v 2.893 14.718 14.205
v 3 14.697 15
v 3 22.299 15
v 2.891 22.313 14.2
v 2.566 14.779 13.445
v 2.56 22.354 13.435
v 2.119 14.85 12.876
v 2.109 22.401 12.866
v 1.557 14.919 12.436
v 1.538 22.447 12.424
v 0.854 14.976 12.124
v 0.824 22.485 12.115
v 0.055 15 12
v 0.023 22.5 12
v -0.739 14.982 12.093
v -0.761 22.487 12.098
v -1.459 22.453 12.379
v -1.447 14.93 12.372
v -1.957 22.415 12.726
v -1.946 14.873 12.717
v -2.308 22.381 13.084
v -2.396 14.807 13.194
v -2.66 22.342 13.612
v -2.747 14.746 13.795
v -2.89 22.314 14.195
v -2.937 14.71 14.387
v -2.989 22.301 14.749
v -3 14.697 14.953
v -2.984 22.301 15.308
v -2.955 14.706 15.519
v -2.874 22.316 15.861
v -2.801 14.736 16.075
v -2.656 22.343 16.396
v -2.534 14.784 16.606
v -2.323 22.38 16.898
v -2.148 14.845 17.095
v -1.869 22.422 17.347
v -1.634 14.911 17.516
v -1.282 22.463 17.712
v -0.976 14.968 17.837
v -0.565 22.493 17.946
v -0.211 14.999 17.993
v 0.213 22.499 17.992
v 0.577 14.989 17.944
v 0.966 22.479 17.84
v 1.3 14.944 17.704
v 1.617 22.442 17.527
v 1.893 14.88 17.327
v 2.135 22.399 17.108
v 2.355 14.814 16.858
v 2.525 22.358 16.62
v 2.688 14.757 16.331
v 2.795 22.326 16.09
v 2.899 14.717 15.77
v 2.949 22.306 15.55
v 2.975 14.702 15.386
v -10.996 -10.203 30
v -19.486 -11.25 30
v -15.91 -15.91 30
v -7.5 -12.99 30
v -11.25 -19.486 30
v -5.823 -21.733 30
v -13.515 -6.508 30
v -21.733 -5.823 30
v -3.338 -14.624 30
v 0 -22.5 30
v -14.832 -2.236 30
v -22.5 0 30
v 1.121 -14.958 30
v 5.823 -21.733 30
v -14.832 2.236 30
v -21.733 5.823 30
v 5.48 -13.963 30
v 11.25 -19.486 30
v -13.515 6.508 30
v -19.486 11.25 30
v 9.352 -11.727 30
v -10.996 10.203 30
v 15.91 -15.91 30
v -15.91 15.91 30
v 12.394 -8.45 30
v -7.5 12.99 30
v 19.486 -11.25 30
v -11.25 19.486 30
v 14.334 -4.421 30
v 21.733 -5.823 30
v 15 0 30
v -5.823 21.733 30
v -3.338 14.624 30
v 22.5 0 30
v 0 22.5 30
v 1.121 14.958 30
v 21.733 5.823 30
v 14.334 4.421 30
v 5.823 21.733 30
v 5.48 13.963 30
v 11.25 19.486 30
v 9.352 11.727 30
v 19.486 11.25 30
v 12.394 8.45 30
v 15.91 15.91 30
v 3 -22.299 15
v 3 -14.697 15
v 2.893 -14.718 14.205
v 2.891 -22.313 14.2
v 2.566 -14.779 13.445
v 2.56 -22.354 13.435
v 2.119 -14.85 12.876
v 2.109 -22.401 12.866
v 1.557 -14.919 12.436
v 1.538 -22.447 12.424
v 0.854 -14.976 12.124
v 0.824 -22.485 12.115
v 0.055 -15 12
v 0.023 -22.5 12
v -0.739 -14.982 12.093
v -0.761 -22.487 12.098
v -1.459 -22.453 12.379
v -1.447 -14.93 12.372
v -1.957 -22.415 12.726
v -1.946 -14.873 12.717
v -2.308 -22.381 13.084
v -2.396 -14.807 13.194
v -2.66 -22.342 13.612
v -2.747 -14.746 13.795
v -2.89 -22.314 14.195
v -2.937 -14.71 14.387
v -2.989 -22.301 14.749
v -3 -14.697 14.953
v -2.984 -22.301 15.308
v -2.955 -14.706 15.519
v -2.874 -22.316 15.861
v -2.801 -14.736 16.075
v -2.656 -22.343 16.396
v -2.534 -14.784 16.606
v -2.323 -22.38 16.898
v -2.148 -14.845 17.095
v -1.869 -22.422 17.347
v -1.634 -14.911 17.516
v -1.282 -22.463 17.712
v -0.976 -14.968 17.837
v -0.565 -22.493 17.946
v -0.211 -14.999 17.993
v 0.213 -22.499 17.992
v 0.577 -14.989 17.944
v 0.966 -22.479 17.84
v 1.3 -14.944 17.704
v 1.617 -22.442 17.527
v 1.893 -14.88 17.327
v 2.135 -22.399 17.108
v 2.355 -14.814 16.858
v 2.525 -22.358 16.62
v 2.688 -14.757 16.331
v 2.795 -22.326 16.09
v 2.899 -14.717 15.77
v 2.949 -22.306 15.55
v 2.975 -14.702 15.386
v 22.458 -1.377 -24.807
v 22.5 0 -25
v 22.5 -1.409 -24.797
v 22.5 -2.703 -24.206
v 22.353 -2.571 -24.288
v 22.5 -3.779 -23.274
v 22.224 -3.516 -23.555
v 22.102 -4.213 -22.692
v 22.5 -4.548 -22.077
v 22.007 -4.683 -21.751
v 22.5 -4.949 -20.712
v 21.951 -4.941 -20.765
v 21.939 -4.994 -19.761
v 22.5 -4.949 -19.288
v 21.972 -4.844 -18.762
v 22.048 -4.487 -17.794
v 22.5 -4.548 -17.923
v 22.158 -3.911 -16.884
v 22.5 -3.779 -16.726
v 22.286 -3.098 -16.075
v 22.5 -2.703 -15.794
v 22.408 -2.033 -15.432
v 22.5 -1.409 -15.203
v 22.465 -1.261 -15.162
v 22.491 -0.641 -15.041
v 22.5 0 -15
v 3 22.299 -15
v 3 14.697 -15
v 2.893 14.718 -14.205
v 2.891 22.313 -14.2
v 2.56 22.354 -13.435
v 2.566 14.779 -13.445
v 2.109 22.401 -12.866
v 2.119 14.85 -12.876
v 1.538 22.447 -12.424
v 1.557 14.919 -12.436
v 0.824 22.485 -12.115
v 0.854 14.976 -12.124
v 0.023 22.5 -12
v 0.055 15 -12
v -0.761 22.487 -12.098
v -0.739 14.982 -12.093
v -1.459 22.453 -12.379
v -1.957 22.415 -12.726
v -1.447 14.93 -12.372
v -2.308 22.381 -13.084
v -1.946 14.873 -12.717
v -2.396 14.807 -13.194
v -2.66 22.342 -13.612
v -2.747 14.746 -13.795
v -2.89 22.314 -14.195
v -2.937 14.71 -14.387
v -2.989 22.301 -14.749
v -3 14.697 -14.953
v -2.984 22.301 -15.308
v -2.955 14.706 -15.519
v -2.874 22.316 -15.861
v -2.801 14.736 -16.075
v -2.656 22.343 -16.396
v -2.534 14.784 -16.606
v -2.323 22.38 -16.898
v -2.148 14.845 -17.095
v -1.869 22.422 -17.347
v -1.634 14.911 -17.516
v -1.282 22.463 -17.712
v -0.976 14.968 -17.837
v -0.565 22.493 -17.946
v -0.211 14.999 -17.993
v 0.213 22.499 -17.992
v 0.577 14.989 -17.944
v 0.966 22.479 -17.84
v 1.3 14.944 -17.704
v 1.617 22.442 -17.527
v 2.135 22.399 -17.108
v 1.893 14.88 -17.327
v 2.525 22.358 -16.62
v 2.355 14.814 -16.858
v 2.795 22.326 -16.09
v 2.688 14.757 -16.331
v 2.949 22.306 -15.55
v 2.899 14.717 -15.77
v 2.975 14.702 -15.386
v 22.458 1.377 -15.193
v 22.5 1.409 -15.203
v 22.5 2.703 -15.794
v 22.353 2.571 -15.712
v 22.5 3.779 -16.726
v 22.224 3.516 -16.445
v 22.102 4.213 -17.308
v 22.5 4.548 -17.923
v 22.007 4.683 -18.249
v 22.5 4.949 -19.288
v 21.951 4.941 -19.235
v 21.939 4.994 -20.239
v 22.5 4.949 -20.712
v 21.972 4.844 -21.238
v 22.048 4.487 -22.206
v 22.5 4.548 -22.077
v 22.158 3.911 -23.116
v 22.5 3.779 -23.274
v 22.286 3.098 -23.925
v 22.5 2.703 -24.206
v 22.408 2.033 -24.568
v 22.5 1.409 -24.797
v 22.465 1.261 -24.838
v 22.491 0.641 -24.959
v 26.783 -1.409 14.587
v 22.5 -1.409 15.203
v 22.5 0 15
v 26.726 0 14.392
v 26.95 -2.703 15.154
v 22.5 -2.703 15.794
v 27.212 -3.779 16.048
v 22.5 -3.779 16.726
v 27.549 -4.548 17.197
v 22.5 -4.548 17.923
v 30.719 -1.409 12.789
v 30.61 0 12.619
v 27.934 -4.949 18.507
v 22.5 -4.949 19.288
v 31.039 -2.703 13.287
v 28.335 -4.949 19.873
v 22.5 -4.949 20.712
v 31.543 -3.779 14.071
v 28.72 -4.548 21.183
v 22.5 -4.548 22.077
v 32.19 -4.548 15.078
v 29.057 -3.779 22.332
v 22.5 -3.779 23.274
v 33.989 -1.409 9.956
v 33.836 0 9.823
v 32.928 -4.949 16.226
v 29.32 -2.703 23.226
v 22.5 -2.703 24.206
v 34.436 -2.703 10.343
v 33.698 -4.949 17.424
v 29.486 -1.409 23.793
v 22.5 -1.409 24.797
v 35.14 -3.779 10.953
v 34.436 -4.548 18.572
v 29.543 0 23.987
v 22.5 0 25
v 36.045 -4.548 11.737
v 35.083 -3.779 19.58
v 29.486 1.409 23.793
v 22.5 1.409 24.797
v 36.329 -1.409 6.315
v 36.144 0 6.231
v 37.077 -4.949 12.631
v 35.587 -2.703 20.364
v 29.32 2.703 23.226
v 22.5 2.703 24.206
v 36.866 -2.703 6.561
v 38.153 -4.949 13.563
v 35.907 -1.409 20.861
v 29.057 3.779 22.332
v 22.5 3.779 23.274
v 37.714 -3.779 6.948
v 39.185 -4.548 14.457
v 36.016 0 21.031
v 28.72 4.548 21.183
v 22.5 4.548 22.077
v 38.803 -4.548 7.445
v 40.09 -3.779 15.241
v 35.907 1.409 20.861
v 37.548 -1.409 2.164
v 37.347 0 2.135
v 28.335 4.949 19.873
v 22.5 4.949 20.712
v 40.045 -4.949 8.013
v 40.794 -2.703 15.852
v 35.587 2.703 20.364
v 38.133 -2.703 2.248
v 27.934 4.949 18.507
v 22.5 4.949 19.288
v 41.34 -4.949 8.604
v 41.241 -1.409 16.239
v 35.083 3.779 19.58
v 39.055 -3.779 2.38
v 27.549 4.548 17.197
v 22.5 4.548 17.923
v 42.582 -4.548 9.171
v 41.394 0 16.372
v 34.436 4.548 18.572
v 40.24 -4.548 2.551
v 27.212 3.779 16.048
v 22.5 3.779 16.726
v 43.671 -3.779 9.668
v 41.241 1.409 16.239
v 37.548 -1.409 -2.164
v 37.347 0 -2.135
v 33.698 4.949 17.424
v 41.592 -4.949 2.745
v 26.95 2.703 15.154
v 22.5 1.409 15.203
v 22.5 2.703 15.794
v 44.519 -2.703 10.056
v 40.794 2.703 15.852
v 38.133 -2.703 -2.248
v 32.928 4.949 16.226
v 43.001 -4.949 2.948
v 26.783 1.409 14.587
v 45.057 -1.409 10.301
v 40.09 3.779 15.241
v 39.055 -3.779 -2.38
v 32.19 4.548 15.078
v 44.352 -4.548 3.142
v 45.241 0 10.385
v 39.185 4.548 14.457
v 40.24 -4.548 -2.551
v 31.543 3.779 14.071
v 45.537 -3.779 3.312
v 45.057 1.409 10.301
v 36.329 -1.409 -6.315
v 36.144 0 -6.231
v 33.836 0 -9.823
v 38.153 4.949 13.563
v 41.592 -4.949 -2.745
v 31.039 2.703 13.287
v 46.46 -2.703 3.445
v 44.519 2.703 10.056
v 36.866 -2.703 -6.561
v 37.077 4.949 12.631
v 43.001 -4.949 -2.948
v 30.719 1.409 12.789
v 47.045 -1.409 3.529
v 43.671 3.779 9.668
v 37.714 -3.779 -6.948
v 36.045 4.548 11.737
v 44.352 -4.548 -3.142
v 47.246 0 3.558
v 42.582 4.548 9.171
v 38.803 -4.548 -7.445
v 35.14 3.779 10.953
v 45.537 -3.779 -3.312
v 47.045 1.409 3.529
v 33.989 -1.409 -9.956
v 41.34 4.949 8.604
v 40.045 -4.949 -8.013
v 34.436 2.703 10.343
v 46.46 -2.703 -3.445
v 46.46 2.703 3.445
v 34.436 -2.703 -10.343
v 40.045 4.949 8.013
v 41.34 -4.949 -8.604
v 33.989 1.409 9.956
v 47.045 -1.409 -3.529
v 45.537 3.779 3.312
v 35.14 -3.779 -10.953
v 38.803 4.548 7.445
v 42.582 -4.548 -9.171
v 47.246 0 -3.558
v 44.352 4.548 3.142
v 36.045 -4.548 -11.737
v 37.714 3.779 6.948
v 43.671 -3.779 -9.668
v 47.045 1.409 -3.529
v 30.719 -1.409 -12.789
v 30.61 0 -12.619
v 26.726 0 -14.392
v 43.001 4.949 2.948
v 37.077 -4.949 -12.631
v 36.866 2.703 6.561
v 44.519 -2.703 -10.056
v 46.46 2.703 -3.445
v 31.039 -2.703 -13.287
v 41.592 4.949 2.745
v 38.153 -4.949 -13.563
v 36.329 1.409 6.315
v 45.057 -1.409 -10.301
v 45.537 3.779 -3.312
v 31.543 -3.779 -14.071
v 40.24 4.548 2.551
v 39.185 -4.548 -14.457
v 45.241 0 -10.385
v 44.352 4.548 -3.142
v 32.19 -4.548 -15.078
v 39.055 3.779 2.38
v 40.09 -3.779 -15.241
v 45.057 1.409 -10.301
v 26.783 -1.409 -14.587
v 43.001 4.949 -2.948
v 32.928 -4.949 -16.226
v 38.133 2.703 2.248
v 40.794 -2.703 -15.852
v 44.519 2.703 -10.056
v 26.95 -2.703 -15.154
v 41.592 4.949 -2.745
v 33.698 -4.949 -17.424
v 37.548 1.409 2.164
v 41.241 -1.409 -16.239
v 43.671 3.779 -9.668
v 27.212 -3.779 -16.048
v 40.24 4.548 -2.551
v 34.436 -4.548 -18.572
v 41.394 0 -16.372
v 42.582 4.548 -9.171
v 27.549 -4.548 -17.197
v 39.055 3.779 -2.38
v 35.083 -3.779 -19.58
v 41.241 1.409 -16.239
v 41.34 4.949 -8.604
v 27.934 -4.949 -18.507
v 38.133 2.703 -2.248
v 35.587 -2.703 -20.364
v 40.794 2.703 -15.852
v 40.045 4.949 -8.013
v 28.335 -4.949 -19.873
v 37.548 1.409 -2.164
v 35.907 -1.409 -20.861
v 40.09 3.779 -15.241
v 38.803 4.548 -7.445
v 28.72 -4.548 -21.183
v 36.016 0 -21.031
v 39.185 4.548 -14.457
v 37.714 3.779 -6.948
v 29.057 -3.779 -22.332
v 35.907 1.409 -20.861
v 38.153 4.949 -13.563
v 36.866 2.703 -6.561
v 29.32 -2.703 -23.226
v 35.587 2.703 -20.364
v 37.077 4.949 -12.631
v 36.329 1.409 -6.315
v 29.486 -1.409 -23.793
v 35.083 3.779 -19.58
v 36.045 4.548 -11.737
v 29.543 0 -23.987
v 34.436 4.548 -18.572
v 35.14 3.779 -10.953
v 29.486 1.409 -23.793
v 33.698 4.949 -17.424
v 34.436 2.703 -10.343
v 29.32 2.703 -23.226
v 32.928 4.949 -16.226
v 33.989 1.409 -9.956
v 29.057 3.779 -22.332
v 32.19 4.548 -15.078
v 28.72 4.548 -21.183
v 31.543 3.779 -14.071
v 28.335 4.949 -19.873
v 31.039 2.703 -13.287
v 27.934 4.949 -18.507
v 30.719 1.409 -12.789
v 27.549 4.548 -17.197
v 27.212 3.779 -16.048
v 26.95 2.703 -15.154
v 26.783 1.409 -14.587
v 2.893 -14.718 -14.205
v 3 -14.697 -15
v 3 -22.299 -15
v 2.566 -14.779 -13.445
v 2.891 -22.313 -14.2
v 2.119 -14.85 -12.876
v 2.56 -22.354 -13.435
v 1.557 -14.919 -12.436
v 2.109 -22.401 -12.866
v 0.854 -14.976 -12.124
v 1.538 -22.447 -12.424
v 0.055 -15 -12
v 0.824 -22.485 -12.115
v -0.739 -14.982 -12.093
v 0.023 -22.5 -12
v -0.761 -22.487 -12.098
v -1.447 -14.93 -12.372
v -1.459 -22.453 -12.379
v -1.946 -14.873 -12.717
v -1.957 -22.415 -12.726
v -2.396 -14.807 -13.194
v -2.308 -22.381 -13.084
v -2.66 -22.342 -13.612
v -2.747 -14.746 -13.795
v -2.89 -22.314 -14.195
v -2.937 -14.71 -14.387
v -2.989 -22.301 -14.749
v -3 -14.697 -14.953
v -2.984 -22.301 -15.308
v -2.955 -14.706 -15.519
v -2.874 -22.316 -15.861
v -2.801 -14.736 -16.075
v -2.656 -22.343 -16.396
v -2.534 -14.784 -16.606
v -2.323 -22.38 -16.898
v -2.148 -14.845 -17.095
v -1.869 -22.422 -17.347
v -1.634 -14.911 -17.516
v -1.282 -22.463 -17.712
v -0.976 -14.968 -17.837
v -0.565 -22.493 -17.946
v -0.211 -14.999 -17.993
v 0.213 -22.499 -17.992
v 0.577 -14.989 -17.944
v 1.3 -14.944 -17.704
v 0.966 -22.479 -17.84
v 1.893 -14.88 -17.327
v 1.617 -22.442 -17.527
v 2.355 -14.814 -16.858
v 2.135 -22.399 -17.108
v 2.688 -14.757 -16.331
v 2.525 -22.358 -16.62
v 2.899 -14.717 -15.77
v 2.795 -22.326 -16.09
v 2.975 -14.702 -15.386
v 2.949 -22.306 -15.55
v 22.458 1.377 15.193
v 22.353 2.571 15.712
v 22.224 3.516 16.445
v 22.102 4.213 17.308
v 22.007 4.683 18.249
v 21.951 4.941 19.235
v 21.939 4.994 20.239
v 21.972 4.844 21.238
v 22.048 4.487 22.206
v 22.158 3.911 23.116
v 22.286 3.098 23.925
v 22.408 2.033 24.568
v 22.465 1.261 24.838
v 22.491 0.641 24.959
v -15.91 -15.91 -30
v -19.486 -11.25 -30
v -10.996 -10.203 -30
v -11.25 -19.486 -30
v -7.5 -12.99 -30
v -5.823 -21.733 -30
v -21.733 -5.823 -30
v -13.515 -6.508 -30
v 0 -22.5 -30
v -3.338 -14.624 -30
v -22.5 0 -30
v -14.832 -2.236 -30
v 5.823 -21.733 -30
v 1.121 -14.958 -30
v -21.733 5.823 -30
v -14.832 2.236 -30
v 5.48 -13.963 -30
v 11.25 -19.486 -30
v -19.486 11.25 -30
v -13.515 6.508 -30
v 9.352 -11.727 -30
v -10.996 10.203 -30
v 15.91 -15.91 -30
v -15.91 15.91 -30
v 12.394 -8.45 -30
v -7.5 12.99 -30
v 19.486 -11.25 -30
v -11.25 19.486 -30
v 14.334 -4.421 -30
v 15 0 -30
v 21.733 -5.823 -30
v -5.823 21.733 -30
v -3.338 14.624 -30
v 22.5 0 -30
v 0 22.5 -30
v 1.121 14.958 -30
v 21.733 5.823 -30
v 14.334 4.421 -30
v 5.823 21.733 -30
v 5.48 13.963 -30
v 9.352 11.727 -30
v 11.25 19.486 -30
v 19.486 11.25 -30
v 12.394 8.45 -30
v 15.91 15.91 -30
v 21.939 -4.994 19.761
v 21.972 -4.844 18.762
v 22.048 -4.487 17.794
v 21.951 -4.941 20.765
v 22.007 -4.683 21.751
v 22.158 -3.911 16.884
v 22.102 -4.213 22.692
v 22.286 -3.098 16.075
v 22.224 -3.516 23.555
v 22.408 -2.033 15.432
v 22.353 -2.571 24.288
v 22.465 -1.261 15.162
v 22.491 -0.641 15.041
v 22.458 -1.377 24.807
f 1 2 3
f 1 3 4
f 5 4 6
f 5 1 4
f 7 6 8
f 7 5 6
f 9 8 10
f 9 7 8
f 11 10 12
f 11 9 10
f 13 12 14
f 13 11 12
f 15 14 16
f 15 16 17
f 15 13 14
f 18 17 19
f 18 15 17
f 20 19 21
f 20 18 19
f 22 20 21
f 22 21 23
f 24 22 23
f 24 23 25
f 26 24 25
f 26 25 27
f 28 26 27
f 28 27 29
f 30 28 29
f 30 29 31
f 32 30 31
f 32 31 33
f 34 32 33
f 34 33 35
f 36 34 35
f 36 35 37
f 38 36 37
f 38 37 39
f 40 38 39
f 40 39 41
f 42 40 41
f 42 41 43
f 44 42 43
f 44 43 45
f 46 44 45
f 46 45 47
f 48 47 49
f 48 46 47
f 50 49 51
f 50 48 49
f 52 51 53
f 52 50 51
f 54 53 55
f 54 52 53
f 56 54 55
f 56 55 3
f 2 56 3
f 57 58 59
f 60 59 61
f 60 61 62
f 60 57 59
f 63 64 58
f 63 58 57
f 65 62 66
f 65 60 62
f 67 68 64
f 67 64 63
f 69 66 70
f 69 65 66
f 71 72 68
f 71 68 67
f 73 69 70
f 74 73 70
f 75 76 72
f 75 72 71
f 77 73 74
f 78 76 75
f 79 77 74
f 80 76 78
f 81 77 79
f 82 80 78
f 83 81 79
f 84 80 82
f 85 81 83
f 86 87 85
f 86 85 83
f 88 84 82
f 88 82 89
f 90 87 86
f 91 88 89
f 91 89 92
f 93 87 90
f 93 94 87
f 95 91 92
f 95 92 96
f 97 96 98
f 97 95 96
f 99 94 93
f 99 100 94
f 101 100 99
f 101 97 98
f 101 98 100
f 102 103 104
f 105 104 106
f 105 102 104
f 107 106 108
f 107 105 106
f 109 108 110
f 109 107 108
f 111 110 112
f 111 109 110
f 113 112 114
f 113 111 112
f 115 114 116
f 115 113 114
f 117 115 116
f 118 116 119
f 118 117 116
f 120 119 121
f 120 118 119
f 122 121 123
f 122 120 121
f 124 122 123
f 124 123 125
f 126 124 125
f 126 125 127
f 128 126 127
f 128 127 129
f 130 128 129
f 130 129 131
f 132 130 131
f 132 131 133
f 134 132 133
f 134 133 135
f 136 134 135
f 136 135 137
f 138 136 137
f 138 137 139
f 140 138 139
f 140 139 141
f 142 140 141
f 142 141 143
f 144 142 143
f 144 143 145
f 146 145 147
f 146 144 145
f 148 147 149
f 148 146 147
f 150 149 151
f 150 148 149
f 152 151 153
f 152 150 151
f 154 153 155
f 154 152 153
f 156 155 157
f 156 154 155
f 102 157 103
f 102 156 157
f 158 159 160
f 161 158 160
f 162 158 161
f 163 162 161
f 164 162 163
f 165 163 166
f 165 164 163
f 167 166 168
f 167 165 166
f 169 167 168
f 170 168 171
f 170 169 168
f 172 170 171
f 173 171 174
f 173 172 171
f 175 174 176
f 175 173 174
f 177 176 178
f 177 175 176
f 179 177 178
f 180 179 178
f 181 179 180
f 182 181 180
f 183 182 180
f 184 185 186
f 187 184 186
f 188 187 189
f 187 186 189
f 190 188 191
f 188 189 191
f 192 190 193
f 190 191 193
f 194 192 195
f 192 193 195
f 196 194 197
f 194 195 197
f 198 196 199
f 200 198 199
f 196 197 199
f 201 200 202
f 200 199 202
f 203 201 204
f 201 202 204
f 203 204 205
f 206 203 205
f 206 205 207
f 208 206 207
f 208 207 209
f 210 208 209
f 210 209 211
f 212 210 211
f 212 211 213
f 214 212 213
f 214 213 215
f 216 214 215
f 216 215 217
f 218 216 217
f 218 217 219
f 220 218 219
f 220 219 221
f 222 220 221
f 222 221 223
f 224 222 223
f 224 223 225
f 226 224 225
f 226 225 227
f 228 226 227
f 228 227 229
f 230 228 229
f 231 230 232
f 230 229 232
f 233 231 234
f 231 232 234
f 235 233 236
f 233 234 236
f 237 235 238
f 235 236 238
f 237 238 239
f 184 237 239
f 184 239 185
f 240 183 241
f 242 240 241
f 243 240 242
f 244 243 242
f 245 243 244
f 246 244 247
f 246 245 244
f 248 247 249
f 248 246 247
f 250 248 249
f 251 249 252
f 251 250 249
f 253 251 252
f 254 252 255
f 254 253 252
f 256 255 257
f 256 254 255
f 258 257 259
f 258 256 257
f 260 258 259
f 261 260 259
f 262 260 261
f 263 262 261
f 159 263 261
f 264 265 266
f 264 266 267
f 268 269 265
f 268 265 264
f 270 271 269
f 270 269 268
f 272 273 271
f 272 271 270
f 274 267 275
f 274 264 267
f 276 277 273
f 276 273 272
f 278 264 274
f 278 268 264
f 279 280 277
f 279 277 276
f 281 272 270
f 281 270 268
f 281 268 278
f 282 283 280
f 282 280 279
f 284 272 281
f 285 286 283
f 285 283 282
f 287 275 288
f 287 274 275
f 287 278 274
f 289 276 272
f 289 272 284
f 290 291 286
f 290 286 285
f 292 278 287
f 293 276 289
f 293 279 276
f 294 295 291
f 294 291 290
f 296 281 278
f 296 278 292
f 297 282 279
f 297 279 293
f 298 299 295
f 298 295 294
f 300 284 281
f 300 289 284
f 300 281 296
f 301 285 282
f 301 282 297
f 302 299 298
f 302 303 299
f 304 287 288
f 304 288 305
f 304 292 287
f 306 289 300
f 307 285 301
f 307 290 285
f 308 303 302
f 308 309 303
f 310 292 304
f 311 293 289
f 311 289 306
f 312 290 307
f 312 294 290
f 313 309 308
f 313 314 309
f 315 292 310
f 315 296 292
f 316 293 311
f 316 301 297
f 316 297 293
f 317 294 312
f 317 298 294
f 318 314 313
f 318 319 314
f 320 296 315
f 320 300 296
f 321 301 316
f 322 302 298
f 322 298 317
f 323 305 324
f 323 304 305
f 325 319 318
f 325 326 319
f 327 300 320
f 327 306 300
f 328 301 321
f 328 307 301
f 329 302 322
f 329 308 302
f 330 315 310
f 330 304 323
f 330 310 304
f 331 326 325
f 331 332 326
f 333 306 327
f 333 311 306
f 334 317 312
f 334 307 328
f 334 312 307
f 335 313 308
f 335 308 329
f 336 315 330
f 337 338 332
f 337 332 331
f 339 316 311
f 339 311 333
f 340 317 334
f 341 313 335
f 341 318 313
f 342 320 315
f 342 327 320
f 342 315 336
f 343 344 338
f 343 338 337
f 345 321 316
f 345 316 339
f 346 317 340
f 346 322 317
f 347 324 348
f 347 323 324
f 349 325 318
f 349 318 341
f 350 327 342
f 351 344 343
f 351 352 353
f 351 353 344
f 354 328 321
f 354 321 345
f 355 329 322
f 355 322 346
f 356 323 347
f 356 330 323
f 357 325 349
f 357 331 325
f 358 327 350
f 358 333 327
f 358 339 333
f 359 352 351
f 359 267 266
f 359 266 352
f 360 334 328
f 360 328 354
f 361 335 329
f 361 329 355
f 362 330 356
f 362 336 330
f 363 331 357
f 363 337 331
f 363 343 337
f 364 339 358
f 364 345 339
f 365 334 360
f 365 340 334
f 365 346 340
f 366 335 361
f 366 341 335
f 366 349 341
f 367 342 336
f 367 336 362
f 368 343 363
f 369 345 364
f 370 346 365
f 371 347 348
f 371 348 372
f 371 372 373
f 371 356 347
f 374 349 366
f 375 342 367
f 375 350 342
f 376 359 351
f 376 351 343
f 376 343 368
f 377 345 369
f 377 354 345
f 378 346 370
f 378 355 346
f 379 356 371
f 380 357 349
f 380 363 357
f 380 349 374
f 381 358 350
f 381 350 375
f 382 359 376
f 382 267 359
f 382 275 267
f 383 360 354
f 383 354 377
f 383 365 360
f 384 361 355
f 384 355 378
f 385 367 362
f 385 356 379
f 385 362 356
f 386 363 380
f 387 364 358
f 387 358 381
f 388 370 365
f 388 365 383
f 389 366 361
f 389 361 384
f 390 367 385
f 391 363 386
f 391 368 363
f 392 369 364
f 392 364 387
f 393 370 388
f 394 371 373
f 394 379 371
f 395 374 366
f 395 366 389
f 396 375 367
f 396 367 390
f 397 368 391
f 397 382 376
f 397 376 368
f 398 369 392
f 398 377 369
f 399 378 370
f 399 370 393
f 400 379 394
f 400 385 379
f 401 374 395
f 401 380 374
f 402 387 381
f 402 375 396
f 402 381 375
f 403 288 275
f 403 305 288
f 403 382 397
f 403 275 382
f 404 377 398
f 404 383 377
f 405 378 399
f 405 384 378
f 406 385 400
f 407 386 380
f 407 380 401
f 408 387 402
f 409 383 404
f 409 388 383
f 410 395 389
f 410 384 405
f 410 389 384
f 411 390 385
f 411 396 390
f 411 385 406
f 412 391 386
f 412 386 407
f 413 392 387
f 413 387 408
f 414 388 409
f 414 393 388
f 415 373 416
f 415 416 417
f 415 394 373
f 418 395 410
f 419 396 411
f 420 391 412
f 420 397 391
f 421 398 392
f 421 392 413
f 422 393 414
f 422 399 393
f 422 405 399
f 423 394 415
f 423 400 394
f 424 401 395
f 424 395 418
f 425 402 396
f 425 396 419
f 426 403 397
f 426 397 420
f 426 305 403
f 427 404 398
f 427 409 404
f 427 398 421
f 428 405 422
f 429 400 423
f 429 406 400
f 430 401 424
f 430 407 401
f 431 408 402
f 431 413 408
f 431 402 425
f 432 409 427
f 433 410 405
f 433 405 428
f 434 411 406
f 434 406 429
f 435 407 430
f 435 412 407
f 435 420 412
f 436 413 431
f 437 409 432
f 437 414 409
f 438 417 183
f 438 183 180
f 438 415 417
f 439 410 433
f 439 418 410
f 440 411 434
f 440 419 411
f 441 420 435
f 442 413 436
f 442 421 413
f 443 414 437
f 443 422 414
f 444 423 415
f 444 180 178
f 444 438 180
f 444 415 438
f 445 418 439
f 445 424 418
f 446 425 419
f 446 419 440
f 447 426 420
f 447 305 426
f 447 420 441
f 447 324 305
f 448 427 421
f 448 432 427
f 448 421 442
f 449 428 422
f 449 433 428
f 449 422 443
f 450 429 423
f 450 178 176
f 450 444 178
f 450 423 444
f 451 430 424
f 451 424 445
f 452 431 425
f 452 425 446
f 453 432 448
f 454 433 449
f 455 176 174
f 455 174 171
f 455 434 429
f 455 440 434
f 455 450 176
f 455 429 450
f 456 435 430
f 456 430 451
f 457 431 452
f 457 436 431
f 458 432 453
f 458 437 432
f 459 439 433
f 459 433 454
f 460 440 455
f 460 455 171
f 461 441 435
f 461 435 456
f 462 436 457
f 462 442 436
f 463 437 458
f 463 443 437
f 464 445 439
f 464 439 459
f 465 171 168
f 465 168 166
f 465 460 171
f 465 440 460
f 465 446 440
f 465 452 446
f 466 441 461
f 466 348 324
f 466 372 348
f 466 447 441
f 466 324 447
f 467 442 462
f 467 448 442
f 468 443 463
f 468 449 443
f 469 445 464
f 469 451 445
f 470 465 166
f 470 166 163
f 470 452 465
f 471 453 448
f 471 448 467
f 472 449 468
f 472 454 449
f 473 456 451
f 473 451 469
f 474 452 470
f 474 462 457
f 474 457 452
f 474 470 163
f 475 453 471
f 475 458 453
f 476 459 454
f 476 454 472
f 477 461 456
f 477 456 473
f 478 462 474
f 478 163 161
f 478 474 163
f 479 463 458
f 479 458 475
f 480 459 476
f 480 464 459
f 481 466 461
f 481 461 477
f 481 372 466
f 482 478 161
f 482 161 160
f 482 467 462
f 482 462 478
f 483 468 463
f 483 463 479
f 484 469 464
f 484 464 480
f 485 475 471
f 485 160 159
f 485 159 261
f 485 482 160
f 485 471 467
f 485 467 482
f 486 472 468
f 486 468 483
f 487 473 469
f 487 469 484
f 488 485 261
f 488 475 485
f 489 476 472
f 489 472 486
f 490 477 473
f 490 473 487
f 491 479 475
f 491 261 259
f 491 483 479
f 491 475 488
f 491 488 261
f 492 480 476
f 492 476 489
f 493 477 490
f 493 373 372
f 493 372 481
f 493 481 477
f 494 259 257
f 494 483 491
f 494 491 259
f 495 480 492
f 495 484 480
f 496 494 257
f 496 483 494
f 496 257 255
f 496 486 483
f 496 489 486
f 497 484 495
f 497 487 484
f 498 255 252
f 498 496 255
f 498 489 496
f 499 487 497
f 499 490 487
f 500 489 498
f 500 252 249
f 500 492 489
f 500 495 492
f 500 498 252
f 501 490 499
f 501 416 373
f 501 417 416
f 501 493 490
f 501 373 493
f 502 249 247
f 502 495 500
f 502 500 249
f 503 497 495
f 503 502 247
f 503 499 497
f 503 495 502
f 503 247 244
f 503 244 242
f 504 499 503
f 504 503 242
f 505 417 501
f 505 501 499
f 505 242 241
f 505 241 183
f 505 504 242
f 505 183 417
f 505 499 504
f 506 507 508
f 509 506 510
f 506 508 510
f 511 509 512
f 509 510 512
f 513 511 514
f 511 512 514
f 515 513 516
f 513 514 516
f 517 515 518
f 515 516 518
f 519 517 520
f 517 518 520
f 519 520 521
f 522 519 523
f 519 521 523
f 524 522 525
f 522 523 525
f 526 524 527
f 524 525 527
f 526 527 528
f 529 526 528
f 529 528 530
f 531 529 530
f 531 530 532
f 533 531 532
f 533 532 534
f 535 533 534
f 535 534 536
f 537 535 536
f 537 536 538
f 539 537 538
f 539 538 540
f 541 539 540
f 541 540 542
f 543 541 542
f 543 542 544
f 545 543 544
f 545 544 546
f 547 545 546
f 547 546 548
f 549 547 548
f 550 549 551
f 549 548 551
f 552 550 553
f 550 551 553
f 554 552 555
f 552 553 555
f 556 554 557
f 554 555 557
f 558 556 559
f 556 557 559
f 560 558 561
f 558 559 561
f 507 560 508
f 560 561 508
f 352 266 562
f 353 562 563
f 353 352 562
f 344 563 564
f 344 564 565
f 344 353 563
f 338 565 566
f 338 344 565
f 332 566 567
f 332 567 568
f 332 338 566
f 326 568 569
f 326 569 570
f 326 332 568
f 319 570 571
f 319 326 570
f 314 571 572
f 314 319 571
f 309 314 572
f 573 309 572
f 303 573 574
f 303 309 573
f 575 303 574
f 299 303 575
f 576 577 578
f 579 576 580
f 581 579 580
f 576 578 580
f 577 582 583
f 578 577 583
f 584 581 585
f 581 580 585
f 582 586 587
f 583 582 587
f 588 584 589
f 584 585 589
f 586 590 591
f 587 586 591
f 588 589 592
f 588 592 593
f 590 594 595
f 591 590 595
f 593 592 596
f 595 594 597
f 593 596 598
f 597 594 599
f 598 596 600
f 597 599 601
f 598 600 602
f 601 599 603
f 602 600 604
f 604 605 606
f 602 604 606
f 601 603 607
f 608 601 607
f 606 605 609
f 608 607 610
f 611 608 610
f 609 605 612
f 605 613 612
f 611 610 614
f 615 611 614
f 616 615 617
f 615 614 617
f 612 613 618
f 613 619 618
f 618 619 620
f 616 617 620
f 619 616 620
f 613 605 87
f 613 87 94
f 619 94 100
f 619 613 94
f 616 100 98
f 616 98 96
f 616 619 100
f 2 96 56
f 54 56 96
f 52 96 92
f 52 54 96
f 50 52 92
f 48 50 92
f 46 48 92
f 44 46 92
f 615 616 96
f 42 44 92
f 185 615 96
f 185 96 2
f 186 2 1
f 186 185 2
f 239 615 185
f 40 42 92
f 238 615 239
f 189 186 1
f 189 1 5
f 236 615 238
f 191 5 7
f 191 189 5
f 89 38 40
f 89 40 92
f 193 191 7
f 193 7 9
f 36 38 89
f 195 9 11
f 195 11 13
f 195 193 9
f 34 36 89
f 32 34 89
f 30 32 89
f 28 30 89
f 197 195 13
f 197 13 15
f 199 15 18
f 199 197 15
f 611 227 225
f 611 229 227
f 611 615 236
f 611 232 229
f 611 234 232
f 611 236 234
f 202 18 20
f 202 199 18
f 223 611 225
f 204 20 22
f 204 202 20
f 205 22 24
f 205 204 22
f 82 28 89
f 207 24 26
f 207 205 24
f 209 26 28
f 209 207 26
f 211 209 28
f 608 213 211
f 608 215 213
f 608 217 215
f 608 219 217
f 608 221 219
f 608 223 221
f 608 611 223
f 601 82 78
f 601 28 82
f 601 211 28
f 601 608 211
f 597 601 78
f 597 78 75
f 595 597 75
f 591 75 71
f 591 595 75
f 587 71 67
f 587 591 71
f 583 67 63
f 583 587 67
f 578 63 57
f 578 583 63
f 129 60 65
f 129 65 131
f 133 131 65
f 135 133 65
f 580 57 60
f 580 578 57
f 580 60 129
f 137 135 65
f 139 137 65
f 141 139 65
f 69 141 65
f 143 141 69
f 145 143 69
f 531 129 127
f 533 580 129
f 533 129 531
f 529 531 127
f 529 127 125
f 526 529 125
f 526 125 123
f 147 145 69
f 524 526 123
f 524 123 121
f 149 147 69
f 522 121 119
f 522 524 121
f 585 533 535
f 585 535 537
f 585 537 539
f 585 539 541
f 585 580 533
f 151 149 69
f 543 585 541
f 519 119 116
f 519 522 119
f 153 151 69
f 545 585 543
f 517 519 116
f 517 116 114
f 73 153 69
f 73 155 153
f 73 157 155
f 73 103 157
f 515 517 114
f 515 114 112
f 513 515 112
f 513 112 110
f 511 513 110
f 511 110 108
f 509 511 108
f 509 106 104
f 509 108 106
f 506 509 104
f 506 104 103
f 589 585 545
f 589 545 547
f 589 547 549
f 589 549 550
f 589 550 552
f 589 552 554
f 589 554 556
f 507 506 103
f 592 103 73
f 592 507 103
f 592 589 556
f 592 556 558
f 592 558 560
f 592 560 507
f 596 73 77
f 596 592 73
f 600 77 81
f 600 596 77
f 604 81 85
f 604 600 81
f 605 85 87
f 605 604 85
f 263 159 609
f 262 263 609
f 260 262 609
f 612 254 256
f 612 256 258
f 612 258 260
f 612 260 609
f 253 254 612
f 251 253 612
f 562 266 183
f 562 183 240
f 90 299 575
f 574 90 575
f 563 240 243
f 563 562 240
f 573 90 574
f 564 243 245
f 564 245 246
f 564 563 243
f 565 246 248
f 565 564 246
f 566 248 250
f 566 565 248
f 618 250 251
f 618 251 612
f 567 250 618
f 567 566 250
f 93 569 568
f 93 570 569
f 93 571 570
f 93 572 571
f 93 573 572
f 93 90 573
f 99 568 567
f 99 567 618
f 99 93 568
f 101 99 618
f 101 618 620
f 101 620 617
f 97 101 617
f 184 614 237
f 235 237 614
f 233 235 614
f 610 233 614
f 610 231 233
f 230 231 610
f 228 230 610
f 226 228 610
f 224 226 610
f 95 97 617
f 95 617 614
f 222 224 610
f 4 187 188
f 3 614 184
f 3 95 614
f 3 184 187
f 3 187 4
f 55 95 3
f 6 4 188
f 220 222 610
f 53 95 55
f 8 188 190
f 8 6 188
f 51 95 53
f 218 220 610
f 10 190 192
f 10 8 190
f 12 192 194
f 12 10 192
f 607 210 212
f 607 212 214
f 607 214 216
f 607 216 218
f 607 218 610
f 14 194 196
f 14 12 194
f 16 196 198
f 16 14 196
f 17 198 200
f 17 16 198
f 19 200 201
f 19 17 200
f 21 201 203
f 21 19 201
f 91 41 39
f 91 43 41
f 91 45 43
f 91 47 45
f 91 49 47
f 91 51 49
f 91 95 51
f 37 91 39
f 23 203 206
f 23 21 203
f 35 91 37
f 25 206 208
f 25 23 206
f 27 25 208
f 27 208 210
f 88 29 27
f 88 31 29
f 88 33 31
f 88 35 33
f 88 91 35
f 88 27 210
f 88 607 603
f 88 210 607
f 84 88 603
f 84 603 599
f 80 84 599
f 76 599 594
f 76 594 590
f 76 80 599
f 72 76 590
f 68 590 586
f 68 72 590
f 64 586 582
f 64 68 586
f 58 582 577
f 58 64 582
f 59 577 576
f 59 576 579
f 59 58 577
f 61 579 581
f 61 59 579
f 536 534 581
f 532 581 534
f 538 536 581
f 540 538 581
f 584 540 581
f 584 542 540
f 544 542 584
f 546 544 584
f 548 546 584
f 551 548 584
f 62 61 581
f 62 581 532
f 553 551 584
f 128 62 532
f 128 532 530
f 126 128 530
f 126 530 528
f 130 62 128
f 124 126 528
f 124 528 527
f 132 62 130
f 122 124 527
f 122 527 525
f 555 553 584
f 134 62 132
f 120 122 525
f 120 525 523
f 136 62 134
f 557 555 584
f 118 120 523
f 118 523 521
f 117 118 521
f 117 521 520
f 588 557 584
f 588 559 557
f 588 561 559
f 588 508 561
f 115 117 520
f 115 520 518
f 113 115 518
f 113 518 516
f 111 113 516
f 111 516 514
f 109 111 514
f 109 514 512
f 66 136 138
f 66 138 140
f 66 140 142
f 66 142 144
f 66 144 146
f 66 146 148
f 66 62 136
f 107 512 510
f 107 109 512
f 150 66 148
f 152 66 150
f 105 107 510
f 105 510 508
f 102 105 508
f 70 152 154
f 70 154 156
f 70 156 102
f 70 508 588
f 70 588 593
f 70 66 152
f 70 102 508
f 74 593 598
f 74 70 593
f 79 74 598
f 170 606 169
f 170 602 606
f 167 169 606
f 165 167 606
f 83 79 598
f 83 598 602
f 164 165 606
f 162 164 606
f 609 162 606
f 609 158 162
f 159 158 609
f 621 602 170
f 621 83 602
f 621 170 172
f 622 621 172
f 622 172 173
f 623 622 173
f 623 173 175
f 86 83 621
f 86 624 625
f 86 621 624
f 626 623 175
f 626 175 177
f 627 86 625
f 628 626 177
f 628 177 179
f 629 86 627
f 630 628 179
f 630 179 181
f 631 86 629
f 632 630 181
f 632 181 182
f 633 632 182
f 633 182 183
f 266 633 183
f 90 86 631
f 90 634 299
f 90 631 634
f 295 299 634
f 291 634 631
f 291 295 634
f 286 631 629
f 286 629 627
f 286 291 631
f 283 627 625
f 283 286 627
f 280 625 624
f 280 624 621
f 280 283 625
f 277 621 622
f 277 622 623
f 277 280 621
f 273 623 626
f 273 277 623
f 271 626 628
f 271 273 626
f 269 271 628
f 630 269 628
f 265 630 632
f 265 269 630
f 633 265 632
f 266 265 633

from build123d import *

# Parameters (mm, degrees)
BOSS_EXTRUDE1_DEPTH      = 30
BOSS_EXTRUDE1_DEPTH_BACK = 30
SKETCH1_R                = 22.5
SKETCH1_R_2              = 15
CUT_EXTRUDE1_START       = -50
SKETCH2_R                = 3.000000000000001
CUT_EXTRUDE1_DEPTH       = 80
SKETCH4_R                = 5.000000000000001


with BuildPart() as part:
    # Sketch1 → Boss-Extrude1 (new, two sides: drawn at the far end of the back side and taken through both)
    with BuildSketch(Plane.XY.offset(-BOSS_EXTRUDE1_DEPTH_BACK)):
        Circle(SKETCH1_R)
        Circle(SKETCH1_R_2, mode=Mode.SUBTRACT)
    extrude(amount=BOSS_EXTRUDE1_DEPTH + BOSS_EXTRUDE1_DEPTH_BACK)

    # Sketch2 → Cut-Extrude1 (cut)
    with BuildSketch(Plane(origin=(0, 0, 0), x_dir=(1, 0, 0), z_dir=(0, 1, 0)).offset(CUT_EXTRUDE1_START)):
        with Locations((0, -15)):
            Circle(SKETCH2_R)
    cut_extrude1 = extrude(amount=CUT_EXTRUDE1_DEPTH, mode=Mode.SUBTRACT)

    # Mirror1: Cut-Extrude1 across plane
    add(cut_extrude1.mirror(Plane.XY), mode=Mode.SUBTRACT)

    # Sweep2: sweep along a path in Sketch3
    with BuildLine(Plane(origin=(0, 0, 0), x_dir=(1, 0, 0), z_dir=(0, 1, 0))) as sweep2_path:
        Line((20, -20), (22.500000000000004, -20))
        ThreePointArc((22.500000000000004, -20), (42.50000000000001, 0), (22.500000000000004, 20))
        Line((22.500000000000004, 20), (20.000000000000004, 20))
    # Sketch4 → Sweep2 (sweep)
    with BuildSketch(Plane(origin=(20, 0, 0), x_dir=(0, 0, -1), z_dir=(1, 0, 0))):
        with Locations((-20, 0)):
            Circle(SKETCH4_R)
    sweep(path=sweep2_path.line)


solid = part.part
